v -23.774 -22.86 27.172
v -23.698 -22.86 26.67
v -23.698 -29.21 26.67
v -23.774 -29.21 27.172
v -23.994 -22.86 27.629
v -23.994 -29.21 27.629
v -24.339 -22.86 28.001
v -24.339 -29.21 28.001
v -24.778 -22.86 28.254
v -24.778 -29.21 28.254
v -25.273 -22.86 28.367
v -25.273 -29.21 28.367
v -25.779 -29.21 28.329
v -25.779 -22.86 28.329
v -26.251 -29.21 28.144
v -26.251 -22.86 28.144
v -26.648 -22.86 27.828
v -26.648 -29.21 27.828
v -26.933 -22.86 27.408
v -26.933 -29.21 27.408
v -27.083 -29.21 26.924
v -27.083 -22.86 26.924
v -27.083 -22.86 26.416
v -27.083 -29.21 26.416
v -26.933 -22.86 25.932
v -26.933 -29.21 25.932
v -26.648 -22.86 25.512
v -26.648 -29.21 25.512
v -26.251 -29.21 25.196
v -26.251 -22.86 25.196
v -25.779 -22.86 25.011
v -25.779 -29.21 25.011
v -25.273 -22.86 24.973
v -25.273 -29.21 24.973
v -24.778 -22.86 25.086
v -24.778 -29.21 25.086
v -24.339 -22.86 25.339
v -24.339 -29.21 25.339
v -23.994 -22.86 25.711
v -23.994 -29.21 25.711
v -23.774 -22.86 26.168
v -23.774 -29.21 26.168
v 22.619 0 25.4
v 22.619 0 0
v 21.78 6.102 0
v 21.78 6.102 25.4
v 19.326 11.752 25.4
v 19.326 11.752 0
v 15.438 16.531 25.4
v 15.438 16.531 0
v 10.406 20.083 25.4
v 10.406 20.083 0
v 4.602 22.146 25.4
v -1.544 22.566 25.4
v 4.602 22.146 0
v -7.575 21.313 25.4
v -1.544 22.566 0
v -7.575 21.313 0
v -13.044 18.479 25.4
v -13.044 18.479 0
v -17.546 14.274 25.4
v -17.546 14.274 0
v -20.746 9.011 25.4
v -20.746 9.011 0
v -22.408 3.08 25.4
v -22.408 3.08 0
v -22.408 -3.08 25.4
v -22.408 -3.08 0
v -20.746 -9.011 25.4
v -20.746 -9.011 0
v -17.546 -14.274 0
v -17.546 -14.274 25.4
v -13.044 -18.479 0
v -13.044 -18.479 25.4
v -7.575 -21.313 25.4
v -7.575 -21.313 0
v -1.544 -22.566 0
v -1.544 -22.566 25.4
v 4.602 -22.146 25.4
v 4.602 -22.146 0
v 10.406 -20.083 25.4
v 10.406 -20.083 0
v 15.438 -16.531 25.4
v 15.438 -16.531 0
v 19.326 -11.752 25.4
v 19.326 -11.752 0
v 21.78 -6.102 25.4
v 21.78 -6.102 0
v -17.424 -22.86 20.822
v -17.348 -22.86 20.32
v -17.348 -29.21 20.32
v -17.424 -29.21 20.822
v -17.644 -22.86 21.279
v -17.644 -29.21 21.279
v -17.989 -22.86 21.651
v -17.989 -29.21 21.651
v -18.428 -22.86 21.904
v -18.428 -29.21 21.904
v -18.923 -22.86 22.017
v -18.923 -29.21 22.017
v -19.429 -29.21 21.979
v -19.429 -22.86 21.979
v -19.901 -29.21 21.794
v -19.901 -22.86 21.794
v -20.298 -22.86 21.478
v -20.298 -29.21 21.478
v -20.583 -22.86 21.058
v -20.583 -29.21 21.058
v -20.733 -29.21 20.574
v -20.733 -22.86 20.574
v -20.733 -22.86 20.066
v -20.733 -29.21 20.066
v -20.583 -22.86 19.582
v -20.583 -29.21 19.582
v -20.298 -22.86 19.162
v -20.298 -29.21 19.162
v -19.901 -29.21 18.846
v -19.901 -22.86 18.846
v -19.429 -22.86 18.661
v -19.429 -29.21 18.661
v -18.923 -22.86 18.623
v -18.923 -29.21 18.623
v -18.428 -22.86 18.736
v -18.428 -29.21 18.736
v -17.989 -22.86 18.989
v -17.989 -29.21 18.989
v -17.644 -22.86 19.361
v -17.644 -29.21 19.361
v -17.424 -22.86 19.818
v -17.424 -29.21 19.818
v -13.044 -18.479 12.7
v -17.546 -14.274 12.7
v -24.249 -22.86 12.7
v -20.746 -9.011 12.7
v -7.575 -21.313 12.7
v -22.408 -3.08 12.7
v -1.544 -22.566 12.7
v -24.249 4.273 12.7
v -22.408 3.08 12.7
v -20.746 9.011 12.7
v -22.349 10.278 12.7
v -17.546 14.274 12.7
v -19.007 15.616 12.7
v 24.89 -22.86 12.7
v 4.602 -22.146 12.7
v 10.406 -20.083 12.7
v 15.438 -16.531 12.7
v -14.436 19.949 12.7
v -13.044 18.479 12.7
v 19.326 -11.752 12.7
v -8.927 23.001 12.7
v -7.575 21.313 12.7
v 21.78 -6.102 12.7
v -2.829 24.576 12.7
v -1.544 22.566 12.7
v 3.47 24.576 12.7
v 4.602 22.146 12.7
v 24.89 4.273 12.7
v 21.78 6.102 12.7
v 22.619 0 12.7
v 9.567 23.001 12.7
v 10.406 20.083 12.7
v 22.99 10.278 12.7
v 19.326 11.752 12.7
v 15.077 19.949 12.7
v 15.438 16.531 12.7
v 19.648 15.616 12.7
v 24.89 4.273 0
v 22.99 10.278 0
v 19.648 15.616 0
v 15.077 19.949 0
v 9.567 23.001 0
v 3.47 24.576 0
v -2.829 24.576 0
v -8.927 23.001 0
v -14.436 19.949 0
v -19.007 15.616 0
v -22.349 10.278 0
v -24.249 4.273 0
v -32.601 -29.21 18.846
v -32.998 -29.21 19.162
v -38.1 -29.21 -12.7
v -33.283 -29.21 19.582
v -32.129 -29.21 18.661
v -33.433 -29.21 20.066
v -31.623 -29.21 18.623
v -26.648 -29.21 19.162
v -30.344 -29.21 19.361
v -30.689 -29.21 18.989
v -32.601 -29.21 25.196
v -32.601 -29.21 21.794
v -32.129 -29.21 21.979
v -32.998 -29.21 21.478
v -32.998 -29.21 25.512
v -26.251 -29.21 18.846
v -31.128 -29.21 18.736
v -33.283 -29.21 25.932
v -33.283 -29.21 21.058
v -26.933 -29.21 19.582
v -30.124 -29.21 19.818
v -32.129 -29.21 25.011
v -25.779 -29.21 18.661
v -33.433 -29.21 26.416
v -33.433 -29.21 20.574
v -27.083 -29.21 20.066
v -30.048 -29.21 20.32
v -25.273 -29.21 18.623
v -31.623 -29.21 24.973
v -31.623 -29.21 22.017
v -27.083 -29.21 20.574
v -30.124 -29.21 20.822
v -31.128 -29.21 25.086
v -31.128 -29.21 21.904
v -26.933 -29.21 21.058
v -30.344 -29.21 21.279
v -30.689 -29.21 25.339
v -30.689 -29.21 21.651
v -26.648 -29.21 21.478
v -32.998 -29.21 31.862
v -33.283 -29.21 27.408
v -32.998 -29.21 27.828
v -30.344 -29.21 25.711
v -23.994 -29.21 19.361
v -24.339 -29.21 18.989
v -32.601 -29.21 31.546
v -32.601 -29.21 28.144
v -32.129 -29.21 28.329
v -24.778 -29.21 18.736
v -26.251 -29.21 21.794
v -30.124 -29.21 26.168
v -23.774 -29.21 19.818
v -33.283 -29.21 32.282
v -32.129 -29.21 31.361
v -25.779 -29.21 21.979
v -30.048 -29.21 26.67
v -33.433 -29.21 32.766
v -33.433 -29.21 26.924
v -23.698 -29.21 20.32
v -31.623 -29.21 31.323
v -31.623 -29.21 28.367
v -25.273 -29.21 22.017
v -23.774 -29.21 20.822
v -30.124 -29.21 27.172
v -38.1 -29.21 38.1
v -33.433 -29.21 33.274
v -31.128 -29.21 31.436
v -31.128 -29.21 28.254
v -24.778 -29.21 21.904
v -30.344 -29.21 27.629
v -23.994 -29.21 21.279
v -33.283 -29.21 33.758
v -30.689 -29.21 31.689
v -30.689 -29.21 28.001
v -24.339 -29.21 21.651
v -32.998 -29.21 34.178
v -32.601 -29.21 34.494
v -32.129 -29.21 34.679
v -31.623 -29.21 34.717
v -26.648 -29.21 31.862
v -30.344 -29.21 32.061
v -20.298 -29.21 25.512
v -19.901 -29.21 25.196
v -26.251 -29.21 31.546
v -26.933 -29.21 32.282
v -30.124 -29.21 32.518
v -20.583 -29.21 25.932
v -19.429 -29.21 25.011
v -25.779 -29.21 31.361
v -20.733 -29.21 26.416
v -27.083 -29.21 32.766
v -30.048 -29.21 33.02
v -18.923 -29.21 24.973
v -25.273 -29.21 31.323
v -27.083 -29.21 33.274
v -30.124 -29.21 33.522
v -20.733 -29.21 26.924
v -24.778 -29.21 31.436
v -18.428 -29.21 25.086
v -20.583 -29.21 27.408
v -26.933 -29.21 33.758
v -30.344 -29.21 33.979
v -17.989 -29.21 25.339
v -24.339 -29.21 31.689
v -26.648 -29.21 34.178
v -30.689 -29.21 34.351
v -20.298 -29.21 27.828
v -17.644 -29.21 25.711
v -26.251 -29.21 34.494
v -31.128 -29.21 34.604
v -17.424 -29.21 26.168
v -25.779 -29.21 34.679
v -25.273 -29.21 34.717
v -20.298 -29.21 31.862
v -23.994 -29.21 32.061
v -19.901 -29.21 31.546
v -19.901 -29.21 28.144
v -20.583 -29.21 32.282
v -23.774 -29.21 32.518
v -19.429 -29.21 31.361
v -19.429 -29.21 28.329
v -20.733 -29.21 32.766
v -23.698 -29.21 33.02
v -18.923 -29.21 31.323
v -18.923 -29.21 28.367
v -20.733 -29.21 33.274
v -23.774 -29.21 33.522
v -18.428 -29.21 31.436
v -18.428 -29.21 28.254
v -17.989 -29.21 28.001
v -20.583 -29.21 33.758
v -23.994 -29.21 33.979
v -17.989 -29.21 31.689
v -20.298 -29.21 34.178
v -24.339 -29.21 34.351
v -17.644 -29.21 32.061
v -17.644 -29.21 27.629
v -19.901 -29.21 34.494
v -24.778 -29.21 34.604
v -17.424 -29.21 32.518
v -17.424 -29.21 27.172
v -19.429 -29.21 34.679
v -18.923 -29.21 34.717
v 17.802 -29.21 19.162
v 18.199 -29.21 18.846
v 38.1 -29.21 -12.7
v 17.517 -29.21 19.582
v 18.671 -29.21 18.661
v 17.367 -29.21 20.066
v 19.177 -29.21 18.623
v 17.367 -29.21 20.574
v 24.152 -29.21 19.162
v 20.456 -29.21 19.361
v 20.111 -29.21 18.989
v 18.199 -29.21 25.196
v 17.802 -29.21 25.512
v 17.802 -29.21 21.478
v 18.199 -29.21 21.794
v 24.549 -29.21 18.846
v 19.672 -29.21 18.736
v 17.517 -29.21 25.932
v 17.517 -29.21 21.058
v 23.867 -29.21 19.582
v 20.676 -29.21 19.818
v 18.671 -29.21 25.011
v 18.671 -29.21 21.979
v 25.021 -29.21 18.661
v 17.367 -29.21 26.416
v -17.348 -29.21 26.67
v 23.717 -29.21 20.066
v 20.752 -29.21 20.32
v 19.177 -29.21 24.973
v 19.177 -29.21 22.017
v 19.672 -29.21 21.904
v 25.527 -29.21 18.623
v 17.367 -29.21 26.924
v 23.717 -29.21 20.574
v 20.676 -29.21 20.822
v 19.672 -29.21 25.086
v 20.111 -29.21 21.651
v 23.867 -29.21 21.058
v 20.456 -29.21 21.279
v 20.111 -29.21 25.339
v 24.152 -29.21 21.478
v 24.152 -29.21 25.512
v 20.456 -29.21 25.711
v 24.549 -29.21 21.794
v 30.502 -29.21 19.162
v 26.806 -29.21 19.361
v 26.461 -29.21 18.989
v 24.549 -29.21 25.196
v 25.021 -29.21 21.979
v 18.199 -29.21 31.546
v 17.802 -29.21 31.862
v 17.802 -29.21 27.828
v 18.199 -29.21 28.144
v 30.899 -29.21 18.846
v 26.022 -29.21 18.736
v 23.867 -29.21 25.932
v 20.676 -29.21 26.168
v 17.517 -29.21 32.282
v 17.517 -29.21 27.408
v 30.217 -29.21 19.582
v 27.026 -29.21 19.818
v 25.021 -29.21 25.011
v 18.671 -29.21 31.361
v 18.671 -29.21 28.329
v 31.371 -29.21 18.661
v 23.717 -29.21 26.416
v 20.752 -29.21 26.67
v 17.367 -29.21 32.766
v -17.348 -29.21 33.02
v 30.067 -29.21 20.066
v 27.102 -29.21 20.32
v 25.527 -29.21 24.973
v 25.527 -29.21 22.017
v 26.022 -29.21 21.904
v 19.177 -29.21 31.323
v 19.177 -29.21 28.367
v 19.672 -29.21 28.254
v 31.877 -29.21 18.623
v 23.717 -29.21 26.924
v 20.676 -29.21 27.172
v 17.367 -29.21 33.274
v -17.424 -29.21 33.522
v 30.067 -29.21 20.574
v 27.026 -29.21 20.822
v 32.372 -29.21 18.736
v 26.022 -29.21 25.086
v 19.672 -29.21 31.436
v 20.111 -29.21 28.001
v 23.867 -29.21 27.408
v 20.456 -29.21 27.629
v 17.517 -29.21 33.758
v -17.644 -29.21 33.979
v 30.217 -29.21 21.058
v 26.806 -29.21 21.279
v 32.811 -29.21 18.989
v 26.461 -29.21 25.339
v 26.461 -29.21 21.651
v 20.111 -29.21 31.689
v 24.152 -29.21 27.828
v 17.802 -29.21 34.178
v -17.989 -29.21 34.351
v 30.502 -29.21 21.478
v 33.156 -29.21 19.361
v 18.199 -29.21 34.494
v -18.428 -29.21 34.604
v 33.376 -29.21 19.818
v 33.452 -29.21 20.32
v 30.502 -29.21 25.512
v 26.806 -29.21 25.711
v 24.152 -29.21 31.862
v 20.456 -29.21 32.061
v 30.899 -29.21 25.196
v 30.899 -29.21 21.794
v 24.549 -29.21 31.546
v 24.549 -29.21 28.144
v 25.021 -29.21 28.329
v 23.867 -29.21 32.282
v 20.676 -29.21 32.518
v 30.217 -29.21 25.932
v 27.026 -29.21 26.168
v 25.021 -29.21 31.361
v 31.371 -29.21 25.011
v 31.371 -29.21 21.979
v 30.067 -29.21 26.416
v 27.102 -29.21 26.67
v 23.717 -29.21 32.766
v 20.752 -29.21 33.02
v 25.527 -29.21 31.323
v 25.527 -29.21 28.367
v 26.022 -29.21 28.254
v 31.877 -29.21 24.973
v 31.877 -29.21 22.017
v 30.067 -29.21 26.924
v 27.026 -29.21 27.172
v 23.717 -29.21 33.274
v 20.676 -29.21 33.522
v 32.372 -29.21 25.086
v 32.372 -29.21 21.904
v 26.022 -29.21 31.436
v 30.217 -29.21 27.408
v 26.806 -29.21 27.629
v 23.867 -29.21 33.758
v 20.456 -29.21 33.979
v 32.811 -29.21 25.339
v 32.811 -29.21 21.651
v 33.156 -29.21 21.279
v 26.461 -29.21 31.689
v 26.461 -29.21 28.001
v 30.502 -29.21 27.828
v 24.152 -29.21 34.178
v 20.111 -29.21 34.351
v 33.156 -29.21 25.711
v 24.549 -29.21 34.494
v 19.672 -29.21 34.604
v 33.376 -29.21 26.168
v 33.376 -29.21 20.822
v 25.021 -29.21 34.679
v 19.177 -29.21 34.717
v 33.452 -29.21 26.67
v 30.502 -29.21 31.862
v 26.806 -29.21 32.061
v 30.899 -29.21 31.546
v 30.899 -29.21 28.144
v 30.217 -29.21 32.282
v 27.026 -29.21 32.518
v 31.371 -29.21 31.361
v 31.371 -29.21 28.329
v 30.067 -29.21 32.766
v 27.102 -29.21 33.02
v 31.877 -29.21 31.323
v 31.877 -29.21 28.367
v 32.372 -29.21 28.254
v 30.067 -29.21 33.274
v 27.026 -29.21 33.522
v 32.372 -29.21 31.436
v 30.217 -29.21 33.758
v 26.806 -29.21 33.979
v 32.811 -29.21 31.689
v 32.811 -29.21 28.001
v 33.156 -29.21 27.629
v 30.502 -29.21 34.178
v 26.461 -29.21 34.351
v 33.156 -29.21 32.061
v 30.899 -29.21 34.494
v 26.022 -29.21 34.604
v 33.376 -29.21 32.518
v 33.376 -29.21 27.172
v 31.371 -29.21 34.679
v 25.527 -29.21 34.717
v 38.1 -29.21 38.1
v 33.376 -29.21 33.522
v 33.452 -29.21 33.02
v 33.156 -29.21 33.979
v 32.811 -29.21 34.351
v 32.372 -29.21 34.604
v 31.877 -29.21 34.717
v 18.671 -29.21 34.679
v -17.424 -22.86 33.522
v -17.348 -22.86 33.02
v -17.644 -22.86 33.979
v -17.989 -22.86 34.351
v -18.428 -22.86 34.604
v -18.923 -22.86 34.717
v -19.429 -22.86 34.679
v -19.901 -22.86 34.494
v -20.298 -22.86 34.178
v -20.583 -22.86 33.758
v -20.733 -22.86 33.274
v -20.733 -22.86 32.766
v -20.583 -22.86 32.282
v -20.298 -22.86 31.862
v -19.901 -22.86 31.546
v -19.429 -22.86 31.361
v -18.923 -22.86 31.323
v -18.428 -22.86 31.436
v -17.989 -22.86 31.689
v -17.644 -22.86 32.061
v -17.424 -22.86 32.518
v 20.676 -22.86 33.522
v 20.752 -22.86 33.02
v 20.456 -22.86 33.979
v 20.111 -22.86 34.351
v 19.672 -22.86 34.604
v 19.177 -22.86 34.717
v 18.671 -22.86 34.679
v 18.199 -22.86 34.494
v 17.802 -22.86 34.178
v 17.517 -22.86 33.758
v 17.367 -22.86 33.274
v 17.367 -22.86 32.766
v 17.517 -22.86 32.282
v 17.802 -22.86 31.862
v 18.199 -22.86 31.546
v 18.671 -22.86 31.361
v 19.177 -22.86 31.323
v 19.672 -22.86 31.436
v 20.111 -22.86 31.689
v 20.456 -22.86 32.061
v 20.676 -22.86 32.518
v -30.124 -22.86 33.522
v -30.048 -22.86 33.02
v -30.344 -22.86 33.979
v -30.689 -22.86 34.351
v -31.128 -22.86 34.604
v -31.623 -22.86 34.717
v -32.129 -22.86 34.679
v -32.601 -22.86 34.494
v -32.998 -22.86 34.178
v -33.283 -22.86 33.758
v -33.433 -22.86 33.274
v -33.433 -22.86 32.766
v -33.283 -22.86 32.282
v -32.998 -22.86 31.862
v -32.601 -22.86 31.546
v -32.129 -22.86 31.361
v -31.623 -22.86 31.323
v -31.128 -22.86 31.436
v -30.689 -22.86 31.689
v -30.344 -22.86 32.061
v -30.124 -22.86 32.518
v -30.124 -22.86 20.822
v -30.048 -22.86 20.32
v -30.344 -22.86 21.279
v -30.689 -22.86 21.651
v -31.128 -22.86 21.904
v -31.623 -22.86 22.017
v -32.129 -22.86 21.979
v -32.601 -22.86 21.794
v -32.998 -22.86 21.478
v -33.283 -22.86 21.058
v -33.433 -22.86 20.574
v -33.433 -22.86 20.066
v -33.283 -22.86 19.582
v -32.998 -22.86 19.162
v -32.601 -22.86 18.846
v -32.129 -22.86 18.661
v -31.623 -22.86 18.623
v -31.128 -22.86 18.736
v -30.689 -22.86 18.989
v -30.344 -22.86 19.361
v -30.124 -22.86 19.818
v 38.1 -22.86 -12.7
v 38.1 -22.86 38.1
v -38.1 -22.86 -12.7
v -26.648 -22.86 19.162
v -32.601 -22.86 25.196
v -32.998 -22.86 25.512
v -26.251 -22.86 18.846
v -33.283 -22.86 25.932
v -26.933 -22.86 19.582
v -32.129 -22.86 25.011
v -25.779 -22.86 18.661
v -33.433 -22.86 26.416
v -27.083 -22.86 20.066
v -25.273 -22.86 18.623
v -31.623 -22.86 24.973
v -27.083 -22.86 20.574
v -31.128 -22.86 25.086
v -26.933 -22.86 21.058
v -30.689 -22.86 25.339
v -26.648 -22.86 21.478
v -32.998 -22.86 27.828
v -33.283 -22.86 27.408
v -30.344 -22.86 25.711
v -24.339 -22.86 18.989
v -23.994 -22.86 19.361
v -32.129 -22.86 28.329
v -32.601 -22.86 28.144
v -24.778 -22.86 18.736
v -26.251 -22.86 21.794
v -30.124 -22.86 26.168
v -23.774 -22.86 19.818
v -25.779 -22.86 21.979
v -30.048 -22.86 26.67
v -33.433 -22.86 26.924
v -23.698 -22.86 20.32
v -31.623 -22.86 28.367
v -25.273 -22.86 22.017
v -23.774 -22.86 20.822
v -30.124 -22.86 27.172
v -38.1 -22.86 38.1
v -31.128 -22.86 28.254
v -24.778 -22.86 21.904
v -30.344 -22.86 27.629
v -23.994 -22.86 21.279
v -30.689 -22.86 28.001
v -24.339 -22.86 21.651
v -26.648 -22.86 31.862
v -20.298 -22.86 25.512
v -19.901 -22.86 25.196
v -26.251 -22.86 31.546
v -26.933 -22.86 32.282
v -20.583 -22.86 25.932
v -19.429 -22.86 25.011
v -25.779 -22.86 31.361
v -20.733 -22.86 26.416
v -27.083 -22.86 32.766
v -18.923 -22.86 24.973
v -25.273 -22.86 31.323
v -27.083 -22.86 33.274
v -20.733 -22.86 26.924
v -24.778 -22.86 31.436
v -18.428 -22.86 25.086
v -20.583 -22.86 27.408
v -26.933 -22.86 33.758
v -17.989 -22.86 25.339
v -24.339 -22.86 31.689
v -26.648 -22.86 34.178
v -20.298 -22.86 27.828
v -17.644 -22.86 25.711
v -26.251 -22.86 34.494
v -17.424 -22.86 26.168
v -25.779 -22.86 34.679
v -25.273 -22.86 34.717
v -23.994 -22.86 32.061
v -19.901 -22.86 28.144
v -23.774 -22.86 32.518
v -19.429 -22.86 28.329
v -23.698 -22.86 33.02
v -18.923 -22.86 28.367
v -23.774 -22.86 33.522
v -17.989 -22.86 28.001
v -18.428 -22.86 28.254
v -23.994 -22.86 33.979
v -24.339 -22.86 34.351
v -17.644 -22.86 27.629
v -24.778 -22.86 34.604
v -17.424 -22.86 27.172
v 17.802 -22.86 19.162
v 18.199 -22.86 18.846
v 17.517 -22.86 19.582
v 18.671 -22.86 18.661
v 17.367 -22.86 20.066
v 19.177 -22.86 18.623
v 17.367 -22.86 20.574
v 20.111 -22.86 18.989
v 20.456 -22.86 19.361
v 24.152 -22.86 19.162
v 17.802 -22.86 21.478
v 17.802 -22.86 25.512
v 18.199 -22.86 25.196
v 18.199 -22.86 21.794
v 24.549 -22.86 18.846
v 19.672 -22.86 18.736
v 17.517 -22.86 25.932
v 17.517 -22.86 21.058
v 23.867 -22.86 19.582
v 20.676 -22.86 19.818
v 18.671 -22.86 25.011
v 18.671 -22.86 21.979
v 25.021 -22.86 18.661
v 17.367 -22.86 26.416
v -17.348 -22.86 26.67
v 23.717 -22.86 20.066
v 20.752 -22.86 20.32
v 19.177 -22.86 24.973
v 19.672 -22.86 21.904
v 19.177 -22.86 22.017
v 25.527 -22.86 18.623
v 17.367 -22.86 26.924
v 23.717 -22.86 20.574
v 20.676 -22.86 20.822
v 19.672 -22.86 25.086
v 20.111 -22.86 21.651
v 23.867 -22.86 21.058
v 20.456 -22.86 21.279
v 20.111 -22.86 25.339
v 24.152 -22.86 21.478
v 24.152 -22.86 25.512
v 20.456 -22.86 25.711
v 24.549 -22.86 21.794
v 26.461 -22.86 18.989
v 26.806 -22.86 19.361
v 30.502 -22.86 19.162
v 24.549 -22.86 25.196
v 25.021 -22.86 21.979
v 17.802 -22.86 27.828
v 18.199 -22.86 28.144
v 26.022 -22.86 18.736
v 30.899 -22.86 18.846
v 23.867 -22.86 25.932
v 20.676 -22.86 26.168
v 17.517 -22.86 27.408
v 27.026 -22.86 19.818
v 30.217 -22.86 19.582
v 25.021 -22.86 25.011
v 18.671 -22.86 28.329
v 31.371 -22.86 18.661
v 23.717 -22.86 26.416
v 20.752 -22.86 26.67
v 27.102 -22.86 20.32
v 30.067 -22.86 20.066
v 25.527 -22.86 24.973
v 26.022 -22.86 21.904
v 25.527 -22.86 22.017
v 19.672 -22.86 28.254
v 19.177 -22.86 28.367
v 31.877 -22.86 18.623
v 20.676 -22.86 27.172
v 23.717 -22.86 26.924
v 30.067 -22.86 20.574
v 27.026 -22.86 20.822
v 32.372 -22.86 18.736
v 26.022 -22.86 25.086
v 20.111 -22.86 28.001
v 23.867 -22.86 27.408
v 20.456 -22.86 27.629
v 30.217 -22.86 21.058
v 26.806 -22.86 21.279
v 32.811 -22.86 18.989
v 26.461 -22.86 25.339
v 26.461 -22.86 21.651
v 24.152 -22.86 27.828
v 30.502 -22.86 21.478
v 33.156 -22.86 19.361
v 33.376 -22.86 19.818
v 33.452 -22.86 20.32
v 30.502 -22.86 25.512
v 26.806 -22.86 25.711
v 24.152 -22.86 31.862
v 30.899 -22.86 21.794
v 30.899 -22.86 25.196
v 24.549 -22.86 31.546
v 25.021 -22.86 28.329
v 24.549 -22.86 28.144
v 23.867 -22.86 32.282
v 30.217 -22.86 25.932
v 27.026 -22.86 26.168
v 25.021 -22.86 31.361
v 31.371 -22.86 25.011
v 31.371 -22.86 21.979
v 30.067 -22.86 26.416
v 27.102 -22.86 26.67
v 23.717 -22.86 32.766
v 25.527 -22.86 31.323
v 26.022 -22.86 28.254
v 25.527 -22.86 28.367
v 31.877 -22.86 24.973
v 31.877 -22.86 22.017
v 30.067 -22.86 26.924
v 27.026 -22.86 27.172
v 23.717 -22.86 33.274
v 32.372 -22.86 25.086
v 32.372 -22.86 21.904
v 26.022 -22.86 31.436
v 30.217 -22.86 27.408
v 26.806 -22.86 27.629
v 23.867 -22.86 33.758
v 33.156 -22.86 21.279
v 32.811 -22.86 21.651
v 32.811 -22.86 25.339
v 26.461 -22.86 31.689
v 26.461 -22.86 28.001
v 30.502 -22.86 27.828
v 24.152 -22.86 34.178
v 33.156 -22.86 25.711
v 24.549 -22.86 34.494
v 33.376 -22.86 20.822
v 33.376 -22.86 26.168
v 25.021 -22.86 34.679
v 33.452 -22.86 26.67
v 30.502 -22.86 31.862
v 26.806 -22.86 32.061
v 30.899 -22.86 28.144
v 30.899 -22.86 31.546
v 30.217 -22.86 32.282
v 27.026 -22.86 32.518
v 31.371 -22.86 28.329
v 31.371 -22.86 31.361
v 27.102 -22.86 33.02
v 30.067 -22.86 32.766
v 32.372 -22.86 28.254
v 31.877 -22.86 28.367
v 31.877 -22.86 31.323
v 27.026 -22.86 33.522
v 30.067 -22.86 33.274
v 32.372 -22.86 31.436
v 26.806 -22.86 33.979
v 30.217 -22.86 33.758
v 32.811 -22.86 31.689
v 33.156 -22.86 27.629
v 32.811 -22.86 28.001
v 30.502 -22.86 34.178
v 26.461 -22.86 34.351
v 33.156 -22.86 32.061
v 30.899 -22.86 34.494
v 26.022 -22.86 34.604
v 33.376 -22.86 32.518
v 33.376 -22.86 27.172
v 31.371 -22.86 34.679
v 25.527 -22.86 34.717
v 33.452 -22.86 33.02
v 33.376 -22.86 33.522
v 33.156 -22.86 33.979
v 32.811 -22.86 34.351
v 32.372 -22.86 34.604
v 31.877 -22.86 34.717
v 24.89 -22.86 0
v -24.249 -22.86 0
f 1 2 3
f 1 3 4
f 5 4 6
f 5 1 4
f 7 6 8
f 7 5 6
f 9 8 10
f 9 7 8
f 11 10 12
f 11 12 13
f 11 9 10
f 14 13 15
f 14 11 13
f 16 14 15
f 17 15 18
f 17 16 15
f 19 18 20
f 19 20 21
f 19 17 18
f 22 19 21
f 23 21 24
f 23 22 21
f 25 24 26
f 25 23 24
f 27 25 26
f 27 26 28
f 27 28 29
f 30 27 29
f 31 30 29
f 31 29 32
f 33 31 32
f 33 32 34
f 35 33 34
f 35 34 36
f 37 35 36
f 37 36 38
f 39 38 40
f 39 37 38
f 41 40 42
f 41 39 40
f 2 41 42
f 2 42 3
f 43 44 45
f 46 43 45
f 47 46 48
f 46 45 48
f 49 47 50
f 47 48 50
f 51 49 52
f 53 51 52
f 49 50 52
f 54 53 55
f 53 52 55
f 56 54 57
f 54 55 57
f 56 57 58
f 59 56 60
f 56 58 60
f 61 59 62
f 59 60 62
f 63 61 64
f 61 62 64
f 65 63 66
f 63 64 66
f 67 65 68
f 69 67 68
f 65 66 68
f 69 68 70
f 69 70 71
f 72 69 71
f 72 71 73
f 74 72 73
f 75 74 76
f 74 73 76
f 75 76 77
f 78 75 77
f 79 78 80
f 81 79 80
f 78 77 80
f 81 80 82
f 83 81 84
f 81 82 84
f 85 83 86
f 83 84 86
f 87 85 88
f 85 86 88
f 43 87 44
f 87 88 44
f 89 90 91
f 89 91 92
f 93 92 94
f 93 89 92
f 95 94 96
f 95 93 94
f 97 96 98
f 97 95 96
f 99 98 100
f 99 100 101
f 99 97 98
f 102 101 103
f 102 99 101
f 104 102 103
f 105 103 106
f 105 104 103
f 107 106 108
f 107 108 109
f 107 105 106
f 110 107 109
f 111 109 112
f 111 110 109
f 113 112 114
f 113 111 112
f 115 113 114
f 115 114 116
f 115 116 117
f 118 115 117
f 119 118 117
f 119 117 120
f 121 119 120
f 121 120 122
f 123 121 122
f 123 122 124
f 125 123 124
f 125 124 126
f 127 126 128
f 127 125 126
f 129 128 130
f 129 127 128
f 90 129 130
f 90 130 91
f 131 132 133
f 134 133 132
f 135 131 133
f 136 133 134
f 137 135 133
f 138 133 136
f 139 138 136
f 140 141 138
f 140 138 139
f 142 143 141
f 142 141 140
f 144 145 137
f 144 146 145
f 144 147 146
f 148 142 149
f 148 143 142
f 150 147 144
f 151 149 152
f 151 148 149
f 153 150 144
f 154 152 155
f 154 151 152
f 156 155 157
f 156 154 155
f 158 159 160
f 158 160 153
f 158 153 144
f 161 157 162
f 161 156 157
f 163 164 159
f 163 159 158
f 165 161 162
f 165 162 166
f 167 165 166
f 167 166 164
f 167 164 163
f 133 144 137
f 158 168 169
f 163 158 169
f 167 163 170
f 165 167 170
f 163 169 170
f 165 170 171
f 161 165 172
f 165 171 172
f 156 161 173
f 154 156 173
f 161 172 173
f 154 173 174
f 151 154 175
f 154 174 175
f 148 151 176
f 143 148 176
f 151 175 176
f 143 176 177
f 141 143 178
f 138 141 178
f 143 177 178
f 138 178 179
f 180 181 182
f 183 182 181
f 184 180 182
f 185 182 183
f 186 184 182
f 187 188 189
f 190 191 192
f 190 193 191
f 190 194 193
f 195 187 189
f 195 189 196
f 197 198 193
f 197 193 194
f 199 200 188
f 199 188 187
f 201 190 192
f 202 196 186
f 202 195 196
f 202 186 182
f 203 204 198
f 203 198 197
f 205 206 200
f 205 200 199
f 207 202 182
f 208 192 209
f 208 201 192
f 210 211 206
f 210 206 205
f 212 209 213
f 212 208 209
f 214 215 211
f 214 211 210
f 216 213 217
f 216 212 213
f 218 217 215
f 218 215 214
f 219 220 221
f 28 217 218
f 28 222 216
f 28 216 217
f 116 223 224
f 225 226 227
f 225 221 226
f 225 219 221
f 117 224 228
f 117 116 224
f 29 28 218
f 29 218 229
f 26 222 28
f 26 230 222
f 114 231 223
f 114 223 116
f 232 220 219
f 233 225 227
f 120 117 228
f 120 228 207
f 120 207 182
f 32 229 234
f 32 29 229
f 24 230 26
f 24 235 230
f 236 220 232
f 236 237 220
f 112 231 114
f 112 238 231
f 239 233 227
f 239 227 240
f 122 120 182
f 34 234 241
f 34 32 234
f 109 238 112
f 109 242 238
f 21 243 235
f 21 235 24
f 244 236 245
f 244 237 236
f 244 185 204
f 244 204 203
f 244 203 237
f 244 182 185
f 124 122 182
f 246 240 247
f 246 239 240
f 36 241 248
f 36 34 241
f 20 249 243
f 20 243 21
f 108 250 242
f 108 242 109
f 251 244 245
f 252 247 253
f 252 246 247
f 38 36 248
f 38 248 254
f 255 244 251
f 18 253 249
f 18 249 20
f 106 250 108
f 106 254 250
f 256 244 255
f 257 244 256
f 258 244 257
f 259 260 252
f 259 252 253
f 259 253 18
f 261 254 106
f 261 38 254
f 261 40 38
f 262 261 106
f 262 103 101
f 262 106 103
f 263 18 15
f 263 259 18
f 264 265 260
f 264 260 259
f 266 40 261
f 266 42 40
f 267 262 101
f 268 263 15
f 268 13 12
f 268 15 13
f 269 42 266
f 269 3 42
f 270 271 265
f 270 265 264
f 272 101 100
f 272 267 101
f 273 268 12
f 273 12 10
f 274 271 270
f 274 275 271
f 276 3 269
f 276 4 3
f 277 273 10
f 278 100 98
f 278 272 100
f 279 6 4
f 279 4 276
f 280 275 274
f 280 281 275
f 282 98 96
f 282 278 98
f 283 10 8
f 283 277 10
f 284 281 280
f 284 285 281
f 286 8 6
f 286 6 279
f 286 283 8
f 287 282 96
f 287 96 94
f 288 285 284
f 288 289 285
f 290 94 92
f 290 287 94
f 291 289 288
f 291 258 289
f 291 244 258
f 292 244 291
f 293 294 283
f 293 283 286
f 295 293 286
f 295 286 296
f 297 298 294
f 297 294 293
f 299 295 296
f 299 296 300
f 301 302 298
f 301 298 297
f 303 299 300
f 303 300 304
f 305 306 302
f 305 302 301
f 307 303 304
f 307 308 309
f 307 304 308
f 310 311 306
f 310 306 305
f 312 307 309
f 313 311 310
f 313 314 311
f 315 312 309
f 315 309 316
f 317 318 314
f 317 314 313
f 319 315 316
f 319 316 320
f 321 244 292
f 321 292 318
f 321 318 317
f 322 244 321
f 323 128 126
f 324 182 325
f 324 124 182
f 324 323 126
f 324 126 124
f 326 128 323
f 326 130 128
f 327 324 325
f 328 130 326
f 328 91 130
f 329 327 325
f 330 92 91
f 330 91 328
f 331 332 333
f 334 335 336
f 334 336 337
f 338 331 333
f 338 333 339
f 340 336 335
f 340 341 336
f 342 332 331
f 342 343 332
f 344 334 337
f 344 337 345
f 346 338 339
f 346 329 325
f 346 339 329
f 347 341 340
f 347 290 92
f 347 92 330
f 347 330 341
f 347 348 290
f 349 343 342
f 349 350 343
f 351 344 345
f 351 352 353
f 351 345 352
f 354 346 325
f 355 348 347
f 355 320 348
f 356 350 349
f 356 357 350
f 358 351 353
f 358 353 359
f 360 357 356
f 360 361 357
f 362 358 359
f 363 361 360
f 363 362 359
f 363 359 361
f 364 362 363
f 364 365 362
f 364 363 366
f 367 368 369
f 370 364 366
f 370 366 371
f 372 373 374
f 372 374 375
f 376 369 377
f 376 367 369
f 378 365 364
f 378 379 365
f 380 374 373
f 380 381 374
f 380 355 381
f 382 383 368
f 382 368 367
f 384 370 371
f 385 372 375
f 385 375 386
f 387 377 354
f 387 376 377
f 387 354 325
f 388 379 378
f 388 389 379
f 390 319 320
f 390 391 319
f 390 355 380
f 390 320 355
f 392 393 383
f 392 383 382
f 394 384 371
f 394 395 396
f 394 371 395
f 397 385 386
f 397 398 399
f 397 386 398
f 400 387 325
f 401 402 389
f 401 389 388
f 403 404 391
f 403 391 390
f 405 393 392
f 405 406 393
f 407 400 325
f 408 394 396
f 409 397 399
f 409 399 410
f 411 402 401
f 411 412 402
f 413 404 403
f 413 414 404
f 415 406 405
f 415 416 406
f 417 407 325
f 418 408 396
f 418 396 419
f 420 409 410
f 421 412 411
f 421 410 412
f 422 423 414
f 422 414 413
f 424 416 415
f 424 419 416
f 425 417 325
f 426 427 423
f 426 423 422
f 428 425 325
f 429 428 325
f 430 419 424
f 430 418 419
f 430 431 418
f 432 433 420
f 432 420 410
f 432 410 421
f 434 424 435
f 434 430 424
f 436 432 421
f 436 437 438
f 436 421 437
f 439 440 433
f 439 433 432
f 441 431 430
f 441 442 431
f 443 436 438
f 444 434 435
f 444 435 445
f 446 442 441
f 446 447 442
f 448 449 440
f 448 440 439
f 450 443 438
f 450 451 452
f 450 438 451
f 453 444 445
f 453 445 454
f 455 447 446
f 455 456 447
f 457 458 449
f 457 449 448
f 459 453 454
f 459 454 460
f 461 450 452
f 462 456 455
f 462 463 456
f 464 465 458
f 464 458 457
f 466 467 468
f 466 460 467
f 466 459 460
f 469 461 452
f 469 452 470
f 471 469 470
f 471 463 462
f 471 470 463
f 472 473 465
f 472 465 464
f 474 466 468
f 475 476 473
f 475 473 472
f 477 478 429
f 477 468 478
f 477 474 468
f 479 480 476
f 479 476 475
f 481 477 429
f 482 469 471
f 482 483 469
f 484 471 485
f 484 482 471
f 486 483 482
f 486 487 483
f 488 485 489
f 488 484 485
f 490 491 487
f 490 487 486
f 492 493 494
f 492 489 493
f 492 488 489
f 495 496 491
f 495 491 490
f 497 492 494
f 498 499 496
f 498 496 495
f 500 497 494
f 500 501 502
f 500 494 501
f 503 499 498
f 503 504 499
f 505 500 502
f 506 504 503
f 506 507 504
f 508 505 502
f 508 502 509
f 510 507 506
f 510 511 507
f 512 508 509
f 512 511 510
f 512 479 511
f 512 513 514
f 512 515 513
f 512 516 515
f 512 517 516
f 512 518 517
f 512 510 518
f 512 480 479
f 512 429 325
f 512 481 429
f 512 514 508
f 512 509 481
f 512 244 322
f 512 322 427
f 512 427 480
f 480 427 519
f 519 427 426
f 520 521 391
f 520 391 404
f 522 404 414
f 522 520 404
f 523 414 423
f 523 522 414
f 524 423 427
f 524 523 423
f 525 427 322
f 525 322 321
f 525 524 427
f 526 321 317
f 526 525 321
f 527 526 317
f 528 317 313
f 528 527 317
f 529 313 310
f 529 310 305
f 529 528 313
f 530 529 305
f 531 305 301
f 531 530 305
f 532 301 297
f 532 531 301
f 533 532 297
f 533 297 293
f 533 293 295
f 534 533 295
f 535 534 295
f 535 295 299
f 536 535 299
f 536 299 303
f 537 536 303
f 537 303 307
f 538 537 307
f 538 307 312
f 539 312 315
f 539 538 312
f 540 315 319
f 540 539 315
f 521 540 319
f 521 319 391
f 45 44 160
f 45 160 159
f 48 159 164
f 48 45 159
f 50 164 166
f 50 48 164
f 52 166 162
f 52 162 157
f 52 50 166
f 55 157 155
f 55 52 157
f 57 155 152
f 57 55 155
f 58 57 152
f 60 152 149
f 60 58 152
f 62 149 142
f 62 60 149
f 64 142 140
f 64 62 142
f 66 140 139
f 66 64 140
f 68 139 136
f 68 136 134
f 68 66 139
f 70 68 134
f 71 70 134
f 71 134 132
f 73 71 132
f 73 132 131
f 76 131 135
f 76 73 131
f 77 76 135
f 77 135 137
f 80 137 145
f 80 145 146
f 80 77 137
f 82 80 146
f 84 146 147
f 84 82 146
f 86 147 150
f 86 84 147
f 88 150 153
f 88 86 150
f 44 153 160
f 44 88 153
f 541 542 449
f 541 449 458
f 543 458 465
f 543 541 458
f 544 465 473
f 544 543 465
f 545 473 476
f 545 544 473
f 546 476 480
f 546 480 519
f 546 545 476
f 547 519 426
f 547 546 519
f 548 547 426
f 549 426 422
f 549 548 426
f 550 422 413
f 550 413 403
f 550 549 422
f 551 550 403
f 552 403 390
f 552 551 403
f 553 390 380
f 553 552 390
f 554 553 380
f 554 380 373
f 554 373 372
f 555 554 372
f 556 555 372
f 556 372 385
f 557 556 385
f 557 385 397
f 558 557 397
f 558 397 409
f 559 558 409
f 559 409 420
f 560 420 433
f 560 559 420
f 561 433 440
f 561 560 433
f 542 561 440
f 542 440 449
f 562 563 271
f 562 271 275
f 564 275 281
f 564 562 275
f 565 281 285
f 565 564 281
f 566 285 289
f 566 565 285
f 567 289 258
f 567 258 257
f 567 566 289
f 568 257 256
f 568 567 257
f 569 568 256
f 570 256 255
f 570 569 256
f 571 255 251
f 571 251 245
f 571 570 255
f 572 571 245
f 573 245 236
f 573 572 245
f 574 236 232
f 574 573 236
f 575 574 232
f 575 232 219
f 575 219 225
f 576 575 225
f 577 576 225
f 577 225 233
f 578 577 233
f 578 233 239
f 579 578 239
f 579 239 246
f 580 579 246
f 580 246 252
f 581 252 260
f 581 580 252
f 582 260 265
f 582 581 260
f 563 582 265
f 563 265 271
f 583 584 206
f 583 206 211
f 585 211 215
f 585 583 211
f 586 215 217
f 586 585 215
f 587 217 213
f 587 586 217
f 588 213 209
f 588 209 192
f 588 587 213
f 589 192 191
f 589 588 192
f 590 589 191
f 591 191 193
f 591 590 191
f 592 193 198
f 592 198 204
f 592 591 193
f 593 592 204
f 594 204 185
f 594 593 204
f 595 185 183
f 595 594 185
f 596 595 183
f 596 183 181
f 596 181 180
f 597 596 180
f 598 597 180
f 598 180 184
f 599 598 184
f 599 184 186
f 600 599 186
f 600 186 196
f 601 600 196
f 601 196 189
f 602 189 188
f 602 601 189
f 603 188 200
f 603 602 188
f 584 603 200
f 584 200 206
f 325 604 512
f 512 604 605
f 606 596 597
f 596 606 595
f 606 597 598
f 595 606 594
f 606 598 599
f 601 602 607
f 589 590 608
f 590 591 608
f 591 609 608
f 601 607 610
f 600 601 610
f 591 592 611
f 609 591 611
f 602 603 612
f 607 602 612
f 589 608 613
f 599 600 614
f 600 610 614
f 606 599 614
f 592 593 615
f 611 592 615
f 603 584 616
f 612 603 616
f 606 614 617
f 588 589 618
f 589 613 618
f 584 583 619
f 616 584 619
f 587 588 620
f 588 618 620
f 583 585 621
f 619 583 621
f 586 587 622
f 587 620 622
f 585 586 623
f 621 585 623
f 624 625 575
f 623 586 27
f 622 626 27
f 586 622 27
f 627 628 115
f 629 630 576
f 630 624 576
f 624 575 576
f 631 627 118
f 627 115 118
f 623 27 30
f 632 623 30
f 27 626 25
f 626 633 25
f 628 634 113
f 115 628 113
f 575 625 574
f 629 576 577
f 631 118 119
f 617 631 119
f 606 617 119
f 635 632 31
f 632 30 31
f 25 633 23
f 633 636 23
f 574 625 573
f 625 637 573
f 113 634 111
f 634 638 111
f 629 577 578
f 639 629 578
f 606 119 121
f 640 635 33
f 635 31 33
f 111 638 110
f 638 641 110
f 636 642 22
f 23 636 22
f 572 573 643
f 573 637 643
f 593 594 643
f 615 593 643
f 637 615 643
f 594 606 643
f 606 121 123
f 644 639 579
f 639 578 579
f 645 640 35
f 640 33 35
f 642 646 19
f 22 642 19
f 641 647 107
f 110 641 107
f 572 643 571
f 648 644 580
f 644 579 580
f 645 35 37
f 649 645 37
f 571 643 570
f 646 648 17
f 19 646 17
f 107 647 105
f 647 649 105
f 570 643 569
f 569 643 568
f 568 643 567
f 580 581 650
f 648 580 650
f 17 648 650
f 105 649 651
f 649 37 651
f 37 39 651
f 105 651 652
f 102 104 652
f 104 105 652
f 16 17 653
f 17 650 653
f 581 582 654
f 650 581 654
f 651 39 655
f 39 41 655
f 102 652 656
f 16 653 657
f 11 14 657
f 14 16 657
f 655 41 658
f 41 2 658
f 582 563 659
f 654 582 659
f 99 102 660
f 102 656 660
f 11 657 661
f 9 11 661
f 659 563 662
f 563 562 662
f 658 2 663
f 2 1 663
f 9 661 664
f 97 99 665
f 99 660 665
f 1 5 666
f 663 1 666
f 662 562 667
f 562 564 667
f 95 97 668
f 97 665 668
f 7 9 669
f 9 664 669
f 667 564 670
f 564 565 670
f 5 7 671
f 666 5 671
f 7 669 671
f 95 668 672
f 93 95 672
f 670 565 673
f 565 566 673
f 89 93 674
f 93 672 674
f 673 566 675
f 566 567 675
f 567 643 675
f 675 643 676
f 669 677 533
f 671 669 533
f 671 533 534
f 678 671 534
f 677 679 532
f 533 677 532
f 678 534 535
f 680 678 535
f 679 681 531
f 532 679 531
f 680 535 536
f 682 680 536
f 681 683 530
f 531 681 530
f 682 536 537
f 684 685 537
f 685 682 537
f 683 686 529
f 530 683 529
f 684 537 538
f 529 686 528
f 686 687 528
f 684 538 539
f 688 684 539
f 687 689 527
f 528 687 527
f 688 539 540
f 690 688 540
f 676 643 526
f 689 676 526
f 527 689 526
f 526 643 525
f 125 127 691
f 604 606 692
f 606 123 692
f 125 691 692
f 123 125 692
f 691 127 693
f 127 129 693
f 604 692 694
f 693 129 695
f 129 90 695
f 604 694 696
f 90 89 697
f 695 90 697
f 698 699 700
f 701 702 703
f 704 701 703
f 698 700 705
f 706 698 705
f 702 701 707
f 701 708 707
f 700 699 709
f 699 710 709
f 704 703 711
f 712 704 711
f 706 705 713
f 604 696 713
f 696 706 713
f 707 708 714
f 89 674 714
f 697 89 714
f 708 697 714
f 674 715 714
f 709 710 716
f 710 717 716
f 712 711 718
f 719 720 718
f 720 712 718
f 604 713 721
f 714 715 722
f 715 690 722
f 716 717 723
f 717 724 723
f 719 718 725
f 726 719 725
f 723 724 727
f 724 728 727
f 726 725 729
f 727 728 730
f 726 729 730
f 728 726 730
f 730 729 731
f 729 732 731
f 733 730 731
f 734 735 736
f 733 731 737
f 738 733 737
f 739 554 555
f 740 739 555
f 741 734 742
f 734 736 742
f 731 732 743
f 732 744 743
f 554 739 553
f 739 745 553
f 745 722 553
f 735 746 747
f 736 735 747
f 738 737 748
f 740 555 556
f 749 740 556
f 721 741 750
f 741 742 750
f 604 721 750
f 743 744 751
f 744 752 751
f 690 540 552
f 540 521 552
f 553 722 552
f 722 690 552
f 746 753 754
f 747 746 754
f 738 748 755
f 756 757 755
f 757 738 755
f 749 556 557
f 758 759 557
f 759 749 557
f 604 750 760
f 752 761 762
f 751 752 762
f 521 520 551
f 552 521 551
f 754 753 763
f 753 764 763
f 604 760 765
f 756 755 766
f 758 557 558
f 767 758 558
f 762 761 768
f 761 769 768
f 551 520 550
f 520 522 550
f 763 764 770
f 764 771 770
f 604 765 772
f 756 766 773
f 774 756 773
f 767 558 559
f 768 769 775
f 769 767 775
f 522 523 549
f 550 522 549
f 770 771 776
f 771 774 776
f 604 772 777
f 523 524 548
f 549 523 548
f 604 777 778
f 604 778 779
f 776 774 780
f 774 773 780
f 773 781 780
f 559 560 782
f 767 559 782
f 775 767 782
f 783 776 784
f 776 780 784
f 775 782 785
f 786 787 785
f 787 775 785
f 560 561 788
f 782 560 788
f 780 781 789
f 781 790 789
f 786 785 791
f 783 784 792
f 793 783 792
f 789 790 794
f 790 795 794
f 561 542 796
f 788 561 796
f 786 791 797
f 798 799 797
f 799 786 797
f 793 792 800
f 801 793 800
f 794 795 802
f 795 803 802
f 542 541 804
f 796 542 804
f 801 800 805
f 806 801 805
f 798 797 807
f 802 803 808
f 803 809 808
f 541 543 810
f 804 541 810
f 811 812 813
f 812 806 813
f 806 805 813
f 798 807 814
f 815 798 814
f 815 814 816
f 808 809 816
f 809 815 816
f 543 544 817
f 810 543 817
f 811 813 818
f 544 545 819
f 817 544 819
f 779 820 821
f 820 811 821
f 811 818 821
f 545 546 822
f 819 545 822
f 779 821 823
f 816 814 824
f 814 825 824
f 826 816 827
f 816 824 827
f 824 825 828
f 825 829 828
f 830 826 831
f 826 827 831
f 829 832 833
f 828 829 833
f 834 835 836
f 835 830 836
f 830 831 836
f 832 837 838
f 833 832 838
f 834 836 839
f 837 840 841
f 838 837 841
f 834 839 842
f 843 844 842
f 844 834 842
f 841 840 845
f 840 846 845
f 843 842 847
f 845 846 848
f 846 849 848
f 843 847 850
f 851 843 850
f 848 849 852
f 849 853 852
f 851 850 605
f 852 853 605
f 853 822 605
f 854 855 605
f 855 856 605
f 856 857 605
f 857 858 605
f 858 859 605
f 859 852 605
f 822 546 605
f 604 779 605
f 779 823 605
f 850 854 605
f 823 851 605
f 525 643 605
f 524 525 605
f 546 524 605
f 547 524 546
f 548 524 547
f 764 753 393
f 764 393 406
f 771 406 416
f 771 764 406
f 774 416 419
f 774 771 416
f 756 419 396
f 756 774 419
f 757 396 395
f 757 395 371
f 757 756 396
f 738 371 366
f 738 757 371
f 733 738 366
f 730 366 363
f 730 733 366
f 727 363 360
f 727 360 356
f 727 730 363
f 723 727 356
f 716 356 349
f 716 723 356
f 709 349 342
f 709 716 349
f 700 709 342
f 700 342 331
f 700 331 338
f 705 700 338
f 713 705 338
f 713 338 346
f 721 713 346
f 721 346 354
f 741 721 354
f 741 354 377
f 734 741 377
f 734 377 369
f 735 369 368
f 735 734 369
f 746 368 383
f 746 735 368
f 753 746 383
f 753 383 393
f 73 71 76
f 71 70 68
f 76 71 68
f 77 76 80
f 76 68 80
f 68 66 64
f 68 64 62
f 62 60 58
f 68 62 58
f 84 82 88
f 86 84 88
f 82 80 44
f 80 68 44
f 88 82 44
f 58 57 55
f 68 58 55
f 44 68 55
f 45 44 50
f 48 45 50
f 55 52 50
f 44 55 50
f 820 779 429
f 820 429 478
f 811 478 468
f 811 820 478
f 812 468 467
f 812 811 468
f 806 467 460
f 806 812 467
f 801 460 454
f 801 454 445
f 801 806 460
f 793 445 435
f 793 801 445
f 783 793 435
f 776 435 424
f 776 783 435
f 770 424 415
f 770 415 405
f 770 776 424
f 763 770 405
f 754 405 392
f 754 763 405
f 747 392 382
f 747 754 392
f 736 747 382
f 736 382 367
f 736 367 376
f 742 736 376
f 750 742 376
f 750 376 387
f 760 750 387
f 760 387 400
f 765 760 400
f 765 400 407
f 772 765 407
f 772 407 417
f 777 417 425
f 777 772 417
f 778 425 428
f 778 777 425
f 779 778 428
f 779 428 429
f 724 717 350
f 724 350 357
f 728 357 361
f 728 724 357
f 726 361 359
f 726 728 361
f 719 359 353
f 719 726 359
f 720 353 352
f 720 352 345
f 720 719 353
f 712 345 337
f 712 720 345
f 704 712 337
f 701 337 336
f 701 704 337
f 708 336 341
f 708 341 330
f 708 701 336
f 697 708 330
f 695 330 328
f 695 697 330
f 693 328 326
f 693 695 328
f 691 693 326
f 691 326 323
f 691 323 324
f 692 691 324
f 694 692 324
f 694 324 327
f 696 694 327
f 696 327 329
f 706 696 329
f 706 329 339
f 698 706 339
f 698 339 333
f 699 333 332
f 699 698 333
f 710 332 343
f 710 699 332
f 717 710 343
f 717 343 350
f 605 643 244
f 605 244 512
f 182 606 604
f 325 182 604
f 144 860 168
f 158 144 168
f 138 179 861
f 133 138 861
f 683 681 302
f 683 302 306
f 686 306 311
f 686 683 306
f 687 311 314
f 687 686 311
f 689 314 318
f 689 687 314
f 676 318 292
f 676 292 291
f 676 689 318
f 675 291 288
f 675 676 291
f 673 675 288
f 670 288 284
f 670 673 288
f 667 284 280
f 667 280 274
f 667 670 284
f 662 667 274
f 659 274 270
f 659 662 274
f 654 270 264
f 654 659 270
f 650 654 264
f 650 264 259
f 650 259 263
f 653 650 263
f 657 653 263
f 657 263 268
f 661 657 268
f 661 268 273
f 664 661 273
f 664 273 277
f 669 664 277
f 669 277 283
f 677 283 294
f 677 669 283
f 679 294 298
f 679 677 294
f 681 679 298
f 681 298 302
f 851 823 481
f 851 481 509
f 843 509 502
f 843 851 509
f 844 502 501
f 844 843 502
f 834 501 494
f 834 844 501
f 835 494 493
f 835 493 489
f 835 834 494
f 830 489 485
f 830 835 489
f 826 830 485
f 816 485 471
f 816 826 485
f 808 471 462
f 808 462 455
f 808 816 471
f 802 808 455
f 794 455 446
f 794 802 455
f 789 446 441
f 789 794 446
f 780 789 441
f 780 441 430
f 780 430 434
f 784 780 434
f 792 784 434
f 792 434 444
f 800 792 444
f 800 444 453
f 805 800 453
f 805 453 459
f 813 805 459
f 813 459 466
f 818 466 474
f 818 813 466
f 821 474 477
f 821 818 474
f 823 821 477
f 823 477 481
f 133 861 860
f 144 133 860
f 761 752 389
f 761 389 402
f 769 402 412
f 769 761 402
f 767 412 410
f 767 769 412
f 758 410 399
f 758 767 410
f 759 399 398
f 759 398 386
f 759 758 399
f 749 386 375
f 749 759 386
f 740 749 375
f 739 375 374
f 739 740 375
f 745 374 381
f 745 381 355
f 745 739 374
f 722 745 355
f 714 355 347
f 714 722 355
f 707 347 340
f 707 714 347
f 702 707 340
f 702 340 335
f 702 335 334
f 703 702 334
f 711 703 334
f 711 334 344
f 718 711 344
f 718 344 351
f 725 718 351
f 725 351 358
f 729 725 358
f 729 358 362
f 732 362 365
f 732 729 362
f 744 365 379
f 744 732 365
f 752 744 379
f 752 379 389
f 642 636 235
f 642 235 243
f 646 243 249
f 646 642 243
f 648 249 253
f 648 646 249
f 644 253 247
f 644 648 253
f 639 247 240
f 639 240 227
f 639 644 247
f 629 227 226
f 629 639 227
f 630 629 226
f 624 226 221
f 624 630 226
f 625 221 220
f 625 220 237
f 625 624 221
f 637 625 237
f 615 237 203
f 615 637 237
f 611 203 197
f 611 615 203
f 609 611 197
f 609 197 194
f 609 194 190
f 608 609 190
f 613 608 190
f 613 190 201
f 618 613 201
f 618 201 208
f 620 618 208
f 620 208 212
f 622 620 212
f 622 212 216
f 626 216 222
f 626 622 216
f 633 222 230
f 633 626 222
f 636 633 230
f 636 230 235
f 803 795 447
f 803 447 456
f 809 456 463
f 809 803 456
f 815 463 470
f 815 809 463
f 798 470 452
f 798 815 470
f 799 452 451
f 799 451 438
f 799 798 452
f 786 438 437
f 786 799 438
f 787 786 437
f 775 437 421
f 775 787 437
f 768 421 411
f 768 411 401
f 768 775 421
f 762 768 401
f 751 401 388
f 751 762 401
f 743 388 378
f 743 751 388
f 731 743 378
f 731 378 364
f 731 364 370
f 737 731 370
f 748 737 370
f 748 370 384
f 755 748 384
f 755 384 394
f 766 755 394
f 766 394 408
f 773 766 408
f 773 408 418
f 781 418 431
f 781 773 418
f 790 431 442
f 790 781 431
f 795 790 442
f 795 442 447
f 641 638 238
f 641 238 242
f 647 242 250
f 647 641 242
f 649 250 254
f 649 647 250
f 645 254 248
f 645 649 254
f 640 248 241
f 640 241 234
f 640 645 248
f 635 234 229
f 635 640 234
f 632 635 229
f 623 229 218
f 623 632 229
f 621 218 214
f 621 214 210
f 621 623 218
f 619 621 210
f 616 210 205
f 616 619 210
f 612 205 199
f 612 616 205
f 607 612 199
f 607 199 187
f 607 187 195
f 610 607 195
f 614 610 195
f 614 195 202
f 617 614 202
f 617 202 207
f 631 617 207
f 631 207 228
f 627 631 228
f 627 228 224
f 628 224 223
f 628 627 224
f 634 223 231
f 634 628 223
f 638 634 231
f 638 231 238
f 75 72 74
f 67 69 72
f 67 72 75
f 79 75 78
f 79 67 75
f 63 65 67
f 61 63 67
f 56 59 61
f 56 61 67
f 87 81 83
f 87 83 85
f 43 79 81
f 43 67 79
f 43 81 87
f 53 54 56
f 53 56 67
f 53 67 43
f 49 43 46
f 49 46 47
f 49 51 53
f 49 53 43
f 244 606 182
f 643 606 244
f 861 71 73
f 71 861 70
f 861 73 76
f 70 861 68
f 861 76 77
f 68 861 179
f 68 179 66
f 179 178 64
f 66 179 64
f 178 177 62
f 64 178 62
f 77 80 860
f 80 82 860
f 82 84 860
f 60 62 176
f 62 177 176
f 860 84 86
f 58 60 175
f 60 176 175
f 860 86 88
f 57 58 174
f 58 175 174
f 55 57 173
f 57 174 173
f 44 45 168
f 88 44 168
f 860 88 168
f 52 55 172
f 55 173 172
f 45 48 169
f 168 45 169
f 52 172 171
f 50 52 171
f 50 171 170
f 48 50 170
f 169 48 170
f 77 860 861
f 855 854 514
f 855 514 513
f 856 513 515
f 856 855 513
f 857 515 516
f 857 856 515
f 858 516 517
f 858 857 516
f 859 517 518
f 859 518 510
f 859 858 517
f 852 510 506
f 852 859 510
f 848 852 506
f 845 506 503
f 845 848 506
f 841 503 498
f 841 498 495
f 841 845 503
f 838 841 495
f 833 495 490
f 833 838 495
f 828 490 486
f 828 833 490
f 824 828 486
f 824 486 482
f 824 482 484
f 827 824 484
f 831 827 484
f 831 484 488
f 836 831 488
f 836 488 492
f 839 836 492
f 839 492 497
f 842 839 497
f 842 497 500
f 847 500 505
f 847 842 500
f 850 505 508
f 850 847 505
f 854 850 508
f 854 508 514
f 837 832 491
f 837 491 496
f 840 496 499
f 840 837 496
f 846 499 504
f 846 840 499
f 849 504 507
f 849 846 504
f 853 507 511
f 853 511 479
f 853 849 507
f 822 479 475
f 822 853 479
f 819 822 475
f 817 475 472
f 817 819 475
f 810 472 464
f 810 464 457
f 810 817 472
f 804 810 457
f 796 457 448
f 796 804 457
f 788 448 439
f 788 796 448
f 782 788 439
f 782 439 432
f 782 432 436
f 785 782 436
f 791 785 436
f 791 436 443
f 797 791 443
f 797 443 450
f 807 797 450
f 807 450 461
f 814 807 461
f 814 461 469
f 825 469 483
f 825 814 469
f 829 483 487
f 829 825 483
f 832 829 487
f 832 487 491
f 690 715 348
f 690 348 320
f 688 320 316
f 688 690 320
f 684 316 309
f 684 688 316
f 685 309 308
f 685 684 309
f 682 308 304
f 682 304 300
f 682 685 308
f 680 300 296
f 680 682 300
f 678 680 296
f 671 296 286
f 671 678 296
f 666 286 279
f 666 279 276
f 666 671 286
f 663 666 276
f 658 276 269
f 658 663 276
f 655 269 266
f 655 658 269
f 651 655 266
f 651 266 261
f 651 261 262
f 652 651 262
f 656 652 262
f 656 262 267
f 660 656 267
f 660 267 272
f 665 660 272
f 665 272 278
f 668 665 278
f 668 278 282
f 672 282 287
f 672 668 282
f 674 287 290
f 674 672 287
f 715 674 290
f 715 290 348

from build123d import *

# Parameters (mm, degrees)
F0_R     = 22.6187
F1_DEPTH = 25.4
F3_W     = 76.2
F3_H     = 50.8
F3_R     = 1.7018
F4_DEPTH = 6.35
F5_R     = 22.6187
F6_DEPTH = 12.7


with BuildPart() as f1:
    # F0 (on Top) → F1 (new body)
    with BuildSketch(Plane.XY):
        Circle(F0_R)
    extrude(amount=F1_DEPTH)


with BuildPart() as f4:
    # F3 (on offset) → F4 (new body)
    with BuildSketch(Plane.XZ.offset(22.86)):
        with Locations((0, 12.7)):
            Rectangle(F3_W, F3_H)
        with Locations((-31.75, 20.32)):
            Circle(F3_R, mode=Mode.SUBTRACT)
        with Locations((-25.4, 20.32)):
            Circle(F3_R, mode=Mode.SUBTRACT)
        with Locations((-19.05, 20.32)):
            Circle(F3_R, mode=Mode.SUBTRACT)
        with Locations((-31.75, 26.67)):
            Circle(F3_R, mode=Mode.SUBTRACT)
        with Locations((-25.4, 26.67)):
            Circle(F3_R, mode=Mode.SUBTRACT)
        with Locations((-31.75, 33.02)):
            Circle(F3_R, mode=Mode.SUBTRACT)
        with Locations((-25.4, 33.02)):
            Circle(F3_R, mode=Mode.SUBTRACT)
        with Locations((-19.05, 26.67)):
            Circle(F3_R, mode=Mode.SUBTRACT)
        with Locations((-19.05, 33.02)):
            Circle(F3_R, mode=Mode.SUBTRACT)
        with Locations((19.05, 20.32)):
            Circle(F3_R, mode=Mode.SUBTRACT)
        with Locations((25.4, 20.32)):
            Circle(F3_R, mode=Mode.SUBTRACT)
        with Locations((31.75, 20.32)):
            Circle(F3_R, mode=Mode.SUBTRACT)
        with Locations((19.05, 26.67)):
            Circle(F3_R, mode=Mode.SUBTRACT)
        with Locations((25.4, 26.67)):
            Circle(F3_R, mode=Mode.SUBTRACT)
        with Locations((31.75, 26.67)):
            Circle(F3_R, mode=Mode.SUBTRACT)
        with Locations((19.05, 33.02)):
            Circle(F3_R, mode=Mode.SUBTRACT)
        with Locations((25.4, 33.02)):
            Circle(F3_R, mode=Mode.SUBTRACT)
        with Locations((31.75, 33.02)):
            Circle(F3_R, mode=Mode.SUBTRACT)
    extrude(amount=F4_DEPTH)


with BuildPart() as f6:
    # F5 (on Top) → F6 (new body)
    with BuildSketch(Plane.XY):
        with BuildLine():
            Line((-24.248691, 4.272898), (-24.248691, -22.86))
            Line((-24.248691, -22.86), (24.889627, -22.86))
            Line((24.889627, -22.86), (24.889627, 4.272898))
            ThreePointArc((24.889627, 4.272898), (0.320468, 24.775638), (-24.248691, 4.272898))
        make_face()
        Circle(F5_R, mode=Mode.SUBTRACT)
    extrude(amount=F6_DEPTH)


solid = Compound([f1.part, f4.part, f6.part])
